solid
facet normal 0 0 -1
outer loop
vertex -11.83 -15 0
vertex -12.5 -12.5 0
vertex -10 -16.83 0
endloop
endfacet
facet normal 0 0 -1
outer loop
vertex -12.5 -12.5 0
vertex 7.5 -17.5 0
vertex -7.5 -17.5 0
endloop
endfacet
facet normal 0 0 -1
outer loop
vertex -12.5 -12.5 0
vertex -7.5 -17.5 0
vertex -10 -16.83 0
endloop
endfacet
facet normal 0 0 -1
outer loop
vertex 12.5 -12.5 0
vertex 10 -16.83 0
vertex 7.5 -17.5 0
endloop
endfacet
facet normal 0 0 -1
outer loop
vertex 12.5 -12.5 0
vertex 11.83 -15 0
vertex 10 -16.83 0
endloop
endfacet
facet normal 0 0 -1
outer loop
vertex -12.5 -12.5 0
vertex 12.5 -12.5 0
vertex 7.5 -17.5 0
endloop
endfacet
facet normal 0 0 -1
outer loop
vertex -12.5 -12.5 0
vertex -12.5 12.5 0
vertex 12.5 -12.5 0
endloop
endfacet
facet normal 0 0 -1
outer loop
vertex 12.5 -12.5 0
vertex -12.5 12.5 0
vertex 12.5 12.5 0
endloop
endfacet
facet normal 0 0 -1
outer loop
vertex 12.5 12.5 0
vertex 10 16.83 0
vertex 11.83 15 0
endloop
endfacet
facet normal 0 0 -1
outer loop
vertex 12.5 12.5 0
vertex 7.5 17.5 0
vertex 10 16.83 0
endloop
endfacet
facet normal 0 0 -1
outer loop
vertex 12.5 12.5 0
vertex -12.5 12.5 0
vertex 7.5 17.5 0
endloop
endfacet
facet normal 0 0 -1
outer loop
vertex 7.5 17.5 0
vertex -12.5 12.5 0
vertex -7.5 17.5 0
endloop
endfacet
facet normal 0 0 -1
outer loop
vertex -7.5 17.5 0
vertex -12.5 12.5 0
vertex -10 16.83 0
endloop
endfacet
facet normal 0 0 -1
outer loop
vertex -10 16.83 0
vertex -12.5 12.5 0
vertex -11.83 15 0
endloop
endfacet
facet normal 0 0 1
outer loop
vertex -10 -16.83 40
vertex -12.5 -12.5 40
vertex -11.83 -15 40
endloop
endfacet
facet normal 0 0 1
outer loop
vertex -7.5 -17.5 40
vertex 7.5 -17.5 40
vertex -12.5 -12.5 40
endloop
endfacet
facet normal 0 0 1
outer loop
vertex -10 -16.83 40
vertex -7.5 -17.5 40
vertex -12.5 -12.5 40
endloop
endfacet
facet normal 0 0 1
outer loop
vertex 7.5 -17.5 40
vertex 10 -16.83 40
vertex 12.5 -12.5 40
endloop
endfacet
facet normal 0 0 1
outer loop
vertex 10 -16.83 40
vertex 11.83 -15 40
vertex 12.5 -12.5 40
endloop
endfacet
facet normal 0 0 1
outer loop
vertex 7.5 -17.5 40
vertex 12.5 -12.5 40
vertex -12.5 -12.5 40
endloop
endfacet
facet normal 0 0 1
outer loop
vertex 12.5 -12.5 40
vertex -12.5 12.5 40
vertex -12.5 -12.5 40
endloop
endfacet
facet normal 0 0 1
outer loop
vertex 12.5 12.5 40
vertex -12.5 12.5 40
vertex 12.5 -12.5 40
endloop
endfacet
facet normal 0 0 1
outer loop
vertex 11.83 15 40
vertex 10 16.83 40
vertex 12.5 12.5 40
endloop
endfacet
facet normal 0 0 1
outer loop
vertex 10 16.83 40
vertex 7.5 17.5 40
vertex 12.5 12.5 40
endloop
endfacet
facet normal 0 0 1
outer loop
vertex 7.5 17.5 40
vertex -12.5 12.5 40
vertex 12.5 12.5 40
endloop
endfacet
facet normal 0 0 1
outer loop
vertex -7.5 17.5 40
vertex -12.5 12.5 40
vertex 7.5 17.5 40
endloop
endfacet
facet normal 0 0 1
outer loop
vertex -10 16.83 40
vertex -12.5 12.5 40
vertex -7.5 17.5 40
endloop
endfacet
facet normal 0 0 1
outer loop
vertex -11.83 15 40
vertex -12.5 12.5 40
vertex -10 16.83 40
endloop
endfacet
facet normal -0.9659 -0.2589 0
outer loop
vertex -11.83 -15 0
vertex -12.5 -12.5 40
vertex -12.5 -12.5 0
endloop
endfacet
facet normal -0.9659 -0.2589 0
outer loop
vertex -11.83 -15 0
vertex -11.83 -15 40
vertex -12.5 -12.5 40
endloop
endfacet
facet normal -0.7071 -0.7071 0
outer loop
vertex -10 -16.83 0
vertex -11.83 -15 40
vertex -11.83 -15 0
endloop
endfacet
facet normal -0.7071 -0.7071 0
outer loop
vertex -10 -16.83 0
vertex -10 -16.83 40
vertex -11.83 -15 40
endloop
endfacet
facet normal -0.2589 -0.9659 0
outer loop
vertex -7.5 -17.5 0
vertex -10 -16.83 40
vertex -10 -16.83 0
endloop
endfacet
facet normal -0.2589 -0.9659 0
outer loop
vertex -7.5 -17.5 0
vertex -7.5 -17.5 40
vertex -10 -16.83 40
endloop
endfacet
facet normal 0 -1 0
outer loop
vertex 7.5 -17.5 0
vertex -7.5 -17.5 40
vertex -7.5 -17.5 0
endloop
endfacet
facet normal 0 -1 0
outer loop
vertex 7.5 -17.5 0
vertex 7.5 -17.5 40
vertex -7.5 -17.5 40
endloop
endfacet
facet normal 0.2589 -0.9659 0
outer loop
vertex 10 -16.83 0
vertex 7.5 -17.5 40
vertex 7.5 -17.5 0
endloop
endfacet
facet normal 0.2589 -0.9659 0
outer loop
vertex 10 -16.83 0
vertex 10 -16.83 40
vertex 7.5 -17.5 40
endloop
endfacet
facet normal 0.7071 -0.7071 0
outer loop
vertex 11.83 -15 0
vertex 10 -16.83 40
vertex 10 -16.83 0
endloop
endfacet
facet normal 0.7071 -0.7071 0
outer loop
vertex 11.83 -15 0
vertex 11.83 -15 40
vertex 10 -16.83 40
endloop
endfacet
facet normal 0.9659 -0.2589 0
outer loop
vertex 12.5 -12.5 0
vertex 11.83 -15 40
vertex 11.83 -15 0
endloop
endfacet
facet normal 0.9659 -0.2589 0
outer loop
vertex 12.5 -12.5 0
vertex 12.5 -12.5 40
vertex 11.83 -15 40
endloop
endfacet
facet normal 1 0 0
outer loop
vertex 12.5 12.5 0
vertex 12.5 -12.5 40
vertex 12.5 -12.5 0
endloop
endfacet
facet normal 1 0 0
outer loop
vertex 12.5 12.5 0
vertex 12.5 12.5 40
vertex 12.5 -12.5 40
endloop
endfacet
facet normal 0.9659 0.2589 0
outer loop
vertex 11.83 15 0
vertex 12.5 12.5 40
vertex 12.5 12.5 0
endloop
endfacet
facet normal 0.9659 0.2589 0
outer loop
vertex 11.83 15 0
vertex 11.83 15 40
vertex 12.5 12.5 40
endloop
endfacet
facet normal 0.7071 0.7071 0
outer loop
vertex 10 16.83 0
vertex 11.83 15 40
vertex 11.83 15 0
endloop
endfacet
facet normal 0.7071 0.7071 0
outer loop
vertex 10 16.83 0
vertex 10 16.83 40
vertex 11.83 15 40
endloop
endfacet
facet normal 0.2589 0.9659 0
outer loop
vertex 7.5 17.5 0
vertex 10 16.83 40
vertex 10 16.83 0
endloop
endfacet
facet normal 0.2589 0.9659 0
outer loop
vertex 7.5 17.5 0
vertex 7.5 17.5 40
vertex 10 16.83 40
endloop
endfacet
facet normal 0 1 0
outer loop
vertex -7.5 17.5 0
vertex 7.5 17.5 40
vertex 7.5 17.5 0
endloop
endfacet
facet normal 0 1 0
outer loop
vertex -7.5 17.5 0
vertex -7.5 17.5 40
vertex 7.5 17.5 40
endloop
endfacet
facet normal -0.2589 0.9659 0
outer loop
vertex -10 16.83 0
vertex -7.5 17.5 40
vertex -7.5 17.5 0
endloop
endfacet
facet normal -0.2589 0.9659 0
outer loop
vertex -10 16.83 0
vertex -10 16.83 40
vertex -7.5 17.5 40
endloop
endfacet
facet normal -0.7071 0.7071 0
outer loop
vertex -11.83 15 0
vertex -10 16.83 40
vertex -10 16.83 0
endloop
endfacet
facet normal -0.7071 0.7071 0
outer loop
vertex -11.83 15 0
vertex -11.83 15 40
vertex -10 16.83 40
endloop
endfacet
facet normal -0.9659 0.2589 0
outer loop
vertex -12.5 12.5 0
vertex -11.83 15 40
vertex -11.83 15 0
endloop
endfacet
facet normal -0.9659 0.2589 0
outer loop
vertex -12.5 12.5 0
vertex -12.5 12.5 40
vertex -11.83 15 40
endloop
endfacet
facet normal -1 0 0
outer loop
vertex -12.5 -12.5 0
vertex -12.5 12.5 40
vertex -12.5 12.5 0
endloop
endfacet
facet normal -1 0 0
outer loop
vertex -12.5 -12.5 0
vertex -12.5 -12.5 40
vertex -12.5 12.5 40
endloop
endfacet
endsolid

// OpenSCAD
// You could simply do it this way if you have the boxes.scad
// file in your library
//use <boxes.scad>
//roundedBox([20, 30, 40], 5, true); 

// Or, you could do it this way if you want to roll your own
roundedRect([20, 30, 40], 5, $fn=12);

// size - [x,y,z]
// radius - radius of corners
module roundedRect(size, radius)
{
	x = size[0];
	y = size[1];
	z = size[2];

	linear_extrude(height=z)
	hull()
	{
		// place 4 circles in the corners, with the given radius
		translate([(-x/2)+(radius/2), (-y/2)+(radius/2), 0])
		circle(r=radius);
	
		translate([(x/2)-(radius/2), (-y/2)+(radius/2), 0])
		circle(r=radius);
	
		translate([(-x/2)+(radius/2), (y/2)-(radius/2), 0])
		circle(r=radius);
	
		translate([(x/2)-(radius/2), (y/2)-(radius/2), 0])
		circle(r=radius);
	}
}
